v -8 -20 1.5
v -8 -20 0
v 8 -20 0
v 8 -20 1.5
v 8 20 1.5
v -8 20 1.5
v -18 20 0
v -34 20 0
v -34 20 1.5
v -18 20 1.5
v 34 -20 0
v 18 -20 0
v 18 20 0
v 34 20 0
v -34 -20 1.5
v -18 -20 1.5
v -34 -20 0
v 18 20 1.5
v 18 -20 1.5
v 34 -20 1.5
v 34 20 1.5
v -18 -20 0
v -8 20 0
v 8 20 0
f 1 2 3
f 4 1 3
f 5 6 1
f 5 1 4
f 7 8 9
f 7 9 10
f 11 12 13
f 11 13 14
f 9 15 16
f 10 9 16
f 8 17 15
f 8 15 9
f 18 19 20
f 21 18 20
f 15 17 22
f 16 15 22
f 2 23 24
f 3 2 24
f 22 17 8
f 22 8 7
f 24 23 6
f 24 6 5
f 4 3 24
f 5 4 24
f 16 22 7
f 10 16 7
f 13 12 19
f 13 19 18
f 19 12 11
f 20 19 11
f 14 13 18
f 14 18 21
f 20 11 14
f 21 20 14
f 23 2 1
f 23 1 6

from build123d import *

# Parameters (mm, degrees)
F0_W     = 16
F0_H     = 40
F1_DEPTH = 1.5
F2_DEPTH = 1.5
F3_DEPTH = 1.5


with BuildPart() as f1:
    # F0 (on Top) → F1 (new body)
    with BuildSketch(Plane.XY):
        with Locations((-26, 0)):
            Rectangle(F0_W, F0_H)
    extrude(amount=F1_DEPTH)


with BuildPart() as f2:
    # F0 (on Top) → F2 (new body)
    with BuildSketch(Plane.XY):
        Rectangle(F0_W, F0_H)
    extrude(amount=F2_DEPTH)


with BuildPart() as f3:
    # F0 (on Top) → F3 (new body)
    with BuildSketch(Plane.XY):
        with Locations((26, 0)):
            Rectangle(F0_W, F0_H)
    extrude(amount=F3_DEPTH)


solid = Compound([f1.part, f2.part, f3.part])
